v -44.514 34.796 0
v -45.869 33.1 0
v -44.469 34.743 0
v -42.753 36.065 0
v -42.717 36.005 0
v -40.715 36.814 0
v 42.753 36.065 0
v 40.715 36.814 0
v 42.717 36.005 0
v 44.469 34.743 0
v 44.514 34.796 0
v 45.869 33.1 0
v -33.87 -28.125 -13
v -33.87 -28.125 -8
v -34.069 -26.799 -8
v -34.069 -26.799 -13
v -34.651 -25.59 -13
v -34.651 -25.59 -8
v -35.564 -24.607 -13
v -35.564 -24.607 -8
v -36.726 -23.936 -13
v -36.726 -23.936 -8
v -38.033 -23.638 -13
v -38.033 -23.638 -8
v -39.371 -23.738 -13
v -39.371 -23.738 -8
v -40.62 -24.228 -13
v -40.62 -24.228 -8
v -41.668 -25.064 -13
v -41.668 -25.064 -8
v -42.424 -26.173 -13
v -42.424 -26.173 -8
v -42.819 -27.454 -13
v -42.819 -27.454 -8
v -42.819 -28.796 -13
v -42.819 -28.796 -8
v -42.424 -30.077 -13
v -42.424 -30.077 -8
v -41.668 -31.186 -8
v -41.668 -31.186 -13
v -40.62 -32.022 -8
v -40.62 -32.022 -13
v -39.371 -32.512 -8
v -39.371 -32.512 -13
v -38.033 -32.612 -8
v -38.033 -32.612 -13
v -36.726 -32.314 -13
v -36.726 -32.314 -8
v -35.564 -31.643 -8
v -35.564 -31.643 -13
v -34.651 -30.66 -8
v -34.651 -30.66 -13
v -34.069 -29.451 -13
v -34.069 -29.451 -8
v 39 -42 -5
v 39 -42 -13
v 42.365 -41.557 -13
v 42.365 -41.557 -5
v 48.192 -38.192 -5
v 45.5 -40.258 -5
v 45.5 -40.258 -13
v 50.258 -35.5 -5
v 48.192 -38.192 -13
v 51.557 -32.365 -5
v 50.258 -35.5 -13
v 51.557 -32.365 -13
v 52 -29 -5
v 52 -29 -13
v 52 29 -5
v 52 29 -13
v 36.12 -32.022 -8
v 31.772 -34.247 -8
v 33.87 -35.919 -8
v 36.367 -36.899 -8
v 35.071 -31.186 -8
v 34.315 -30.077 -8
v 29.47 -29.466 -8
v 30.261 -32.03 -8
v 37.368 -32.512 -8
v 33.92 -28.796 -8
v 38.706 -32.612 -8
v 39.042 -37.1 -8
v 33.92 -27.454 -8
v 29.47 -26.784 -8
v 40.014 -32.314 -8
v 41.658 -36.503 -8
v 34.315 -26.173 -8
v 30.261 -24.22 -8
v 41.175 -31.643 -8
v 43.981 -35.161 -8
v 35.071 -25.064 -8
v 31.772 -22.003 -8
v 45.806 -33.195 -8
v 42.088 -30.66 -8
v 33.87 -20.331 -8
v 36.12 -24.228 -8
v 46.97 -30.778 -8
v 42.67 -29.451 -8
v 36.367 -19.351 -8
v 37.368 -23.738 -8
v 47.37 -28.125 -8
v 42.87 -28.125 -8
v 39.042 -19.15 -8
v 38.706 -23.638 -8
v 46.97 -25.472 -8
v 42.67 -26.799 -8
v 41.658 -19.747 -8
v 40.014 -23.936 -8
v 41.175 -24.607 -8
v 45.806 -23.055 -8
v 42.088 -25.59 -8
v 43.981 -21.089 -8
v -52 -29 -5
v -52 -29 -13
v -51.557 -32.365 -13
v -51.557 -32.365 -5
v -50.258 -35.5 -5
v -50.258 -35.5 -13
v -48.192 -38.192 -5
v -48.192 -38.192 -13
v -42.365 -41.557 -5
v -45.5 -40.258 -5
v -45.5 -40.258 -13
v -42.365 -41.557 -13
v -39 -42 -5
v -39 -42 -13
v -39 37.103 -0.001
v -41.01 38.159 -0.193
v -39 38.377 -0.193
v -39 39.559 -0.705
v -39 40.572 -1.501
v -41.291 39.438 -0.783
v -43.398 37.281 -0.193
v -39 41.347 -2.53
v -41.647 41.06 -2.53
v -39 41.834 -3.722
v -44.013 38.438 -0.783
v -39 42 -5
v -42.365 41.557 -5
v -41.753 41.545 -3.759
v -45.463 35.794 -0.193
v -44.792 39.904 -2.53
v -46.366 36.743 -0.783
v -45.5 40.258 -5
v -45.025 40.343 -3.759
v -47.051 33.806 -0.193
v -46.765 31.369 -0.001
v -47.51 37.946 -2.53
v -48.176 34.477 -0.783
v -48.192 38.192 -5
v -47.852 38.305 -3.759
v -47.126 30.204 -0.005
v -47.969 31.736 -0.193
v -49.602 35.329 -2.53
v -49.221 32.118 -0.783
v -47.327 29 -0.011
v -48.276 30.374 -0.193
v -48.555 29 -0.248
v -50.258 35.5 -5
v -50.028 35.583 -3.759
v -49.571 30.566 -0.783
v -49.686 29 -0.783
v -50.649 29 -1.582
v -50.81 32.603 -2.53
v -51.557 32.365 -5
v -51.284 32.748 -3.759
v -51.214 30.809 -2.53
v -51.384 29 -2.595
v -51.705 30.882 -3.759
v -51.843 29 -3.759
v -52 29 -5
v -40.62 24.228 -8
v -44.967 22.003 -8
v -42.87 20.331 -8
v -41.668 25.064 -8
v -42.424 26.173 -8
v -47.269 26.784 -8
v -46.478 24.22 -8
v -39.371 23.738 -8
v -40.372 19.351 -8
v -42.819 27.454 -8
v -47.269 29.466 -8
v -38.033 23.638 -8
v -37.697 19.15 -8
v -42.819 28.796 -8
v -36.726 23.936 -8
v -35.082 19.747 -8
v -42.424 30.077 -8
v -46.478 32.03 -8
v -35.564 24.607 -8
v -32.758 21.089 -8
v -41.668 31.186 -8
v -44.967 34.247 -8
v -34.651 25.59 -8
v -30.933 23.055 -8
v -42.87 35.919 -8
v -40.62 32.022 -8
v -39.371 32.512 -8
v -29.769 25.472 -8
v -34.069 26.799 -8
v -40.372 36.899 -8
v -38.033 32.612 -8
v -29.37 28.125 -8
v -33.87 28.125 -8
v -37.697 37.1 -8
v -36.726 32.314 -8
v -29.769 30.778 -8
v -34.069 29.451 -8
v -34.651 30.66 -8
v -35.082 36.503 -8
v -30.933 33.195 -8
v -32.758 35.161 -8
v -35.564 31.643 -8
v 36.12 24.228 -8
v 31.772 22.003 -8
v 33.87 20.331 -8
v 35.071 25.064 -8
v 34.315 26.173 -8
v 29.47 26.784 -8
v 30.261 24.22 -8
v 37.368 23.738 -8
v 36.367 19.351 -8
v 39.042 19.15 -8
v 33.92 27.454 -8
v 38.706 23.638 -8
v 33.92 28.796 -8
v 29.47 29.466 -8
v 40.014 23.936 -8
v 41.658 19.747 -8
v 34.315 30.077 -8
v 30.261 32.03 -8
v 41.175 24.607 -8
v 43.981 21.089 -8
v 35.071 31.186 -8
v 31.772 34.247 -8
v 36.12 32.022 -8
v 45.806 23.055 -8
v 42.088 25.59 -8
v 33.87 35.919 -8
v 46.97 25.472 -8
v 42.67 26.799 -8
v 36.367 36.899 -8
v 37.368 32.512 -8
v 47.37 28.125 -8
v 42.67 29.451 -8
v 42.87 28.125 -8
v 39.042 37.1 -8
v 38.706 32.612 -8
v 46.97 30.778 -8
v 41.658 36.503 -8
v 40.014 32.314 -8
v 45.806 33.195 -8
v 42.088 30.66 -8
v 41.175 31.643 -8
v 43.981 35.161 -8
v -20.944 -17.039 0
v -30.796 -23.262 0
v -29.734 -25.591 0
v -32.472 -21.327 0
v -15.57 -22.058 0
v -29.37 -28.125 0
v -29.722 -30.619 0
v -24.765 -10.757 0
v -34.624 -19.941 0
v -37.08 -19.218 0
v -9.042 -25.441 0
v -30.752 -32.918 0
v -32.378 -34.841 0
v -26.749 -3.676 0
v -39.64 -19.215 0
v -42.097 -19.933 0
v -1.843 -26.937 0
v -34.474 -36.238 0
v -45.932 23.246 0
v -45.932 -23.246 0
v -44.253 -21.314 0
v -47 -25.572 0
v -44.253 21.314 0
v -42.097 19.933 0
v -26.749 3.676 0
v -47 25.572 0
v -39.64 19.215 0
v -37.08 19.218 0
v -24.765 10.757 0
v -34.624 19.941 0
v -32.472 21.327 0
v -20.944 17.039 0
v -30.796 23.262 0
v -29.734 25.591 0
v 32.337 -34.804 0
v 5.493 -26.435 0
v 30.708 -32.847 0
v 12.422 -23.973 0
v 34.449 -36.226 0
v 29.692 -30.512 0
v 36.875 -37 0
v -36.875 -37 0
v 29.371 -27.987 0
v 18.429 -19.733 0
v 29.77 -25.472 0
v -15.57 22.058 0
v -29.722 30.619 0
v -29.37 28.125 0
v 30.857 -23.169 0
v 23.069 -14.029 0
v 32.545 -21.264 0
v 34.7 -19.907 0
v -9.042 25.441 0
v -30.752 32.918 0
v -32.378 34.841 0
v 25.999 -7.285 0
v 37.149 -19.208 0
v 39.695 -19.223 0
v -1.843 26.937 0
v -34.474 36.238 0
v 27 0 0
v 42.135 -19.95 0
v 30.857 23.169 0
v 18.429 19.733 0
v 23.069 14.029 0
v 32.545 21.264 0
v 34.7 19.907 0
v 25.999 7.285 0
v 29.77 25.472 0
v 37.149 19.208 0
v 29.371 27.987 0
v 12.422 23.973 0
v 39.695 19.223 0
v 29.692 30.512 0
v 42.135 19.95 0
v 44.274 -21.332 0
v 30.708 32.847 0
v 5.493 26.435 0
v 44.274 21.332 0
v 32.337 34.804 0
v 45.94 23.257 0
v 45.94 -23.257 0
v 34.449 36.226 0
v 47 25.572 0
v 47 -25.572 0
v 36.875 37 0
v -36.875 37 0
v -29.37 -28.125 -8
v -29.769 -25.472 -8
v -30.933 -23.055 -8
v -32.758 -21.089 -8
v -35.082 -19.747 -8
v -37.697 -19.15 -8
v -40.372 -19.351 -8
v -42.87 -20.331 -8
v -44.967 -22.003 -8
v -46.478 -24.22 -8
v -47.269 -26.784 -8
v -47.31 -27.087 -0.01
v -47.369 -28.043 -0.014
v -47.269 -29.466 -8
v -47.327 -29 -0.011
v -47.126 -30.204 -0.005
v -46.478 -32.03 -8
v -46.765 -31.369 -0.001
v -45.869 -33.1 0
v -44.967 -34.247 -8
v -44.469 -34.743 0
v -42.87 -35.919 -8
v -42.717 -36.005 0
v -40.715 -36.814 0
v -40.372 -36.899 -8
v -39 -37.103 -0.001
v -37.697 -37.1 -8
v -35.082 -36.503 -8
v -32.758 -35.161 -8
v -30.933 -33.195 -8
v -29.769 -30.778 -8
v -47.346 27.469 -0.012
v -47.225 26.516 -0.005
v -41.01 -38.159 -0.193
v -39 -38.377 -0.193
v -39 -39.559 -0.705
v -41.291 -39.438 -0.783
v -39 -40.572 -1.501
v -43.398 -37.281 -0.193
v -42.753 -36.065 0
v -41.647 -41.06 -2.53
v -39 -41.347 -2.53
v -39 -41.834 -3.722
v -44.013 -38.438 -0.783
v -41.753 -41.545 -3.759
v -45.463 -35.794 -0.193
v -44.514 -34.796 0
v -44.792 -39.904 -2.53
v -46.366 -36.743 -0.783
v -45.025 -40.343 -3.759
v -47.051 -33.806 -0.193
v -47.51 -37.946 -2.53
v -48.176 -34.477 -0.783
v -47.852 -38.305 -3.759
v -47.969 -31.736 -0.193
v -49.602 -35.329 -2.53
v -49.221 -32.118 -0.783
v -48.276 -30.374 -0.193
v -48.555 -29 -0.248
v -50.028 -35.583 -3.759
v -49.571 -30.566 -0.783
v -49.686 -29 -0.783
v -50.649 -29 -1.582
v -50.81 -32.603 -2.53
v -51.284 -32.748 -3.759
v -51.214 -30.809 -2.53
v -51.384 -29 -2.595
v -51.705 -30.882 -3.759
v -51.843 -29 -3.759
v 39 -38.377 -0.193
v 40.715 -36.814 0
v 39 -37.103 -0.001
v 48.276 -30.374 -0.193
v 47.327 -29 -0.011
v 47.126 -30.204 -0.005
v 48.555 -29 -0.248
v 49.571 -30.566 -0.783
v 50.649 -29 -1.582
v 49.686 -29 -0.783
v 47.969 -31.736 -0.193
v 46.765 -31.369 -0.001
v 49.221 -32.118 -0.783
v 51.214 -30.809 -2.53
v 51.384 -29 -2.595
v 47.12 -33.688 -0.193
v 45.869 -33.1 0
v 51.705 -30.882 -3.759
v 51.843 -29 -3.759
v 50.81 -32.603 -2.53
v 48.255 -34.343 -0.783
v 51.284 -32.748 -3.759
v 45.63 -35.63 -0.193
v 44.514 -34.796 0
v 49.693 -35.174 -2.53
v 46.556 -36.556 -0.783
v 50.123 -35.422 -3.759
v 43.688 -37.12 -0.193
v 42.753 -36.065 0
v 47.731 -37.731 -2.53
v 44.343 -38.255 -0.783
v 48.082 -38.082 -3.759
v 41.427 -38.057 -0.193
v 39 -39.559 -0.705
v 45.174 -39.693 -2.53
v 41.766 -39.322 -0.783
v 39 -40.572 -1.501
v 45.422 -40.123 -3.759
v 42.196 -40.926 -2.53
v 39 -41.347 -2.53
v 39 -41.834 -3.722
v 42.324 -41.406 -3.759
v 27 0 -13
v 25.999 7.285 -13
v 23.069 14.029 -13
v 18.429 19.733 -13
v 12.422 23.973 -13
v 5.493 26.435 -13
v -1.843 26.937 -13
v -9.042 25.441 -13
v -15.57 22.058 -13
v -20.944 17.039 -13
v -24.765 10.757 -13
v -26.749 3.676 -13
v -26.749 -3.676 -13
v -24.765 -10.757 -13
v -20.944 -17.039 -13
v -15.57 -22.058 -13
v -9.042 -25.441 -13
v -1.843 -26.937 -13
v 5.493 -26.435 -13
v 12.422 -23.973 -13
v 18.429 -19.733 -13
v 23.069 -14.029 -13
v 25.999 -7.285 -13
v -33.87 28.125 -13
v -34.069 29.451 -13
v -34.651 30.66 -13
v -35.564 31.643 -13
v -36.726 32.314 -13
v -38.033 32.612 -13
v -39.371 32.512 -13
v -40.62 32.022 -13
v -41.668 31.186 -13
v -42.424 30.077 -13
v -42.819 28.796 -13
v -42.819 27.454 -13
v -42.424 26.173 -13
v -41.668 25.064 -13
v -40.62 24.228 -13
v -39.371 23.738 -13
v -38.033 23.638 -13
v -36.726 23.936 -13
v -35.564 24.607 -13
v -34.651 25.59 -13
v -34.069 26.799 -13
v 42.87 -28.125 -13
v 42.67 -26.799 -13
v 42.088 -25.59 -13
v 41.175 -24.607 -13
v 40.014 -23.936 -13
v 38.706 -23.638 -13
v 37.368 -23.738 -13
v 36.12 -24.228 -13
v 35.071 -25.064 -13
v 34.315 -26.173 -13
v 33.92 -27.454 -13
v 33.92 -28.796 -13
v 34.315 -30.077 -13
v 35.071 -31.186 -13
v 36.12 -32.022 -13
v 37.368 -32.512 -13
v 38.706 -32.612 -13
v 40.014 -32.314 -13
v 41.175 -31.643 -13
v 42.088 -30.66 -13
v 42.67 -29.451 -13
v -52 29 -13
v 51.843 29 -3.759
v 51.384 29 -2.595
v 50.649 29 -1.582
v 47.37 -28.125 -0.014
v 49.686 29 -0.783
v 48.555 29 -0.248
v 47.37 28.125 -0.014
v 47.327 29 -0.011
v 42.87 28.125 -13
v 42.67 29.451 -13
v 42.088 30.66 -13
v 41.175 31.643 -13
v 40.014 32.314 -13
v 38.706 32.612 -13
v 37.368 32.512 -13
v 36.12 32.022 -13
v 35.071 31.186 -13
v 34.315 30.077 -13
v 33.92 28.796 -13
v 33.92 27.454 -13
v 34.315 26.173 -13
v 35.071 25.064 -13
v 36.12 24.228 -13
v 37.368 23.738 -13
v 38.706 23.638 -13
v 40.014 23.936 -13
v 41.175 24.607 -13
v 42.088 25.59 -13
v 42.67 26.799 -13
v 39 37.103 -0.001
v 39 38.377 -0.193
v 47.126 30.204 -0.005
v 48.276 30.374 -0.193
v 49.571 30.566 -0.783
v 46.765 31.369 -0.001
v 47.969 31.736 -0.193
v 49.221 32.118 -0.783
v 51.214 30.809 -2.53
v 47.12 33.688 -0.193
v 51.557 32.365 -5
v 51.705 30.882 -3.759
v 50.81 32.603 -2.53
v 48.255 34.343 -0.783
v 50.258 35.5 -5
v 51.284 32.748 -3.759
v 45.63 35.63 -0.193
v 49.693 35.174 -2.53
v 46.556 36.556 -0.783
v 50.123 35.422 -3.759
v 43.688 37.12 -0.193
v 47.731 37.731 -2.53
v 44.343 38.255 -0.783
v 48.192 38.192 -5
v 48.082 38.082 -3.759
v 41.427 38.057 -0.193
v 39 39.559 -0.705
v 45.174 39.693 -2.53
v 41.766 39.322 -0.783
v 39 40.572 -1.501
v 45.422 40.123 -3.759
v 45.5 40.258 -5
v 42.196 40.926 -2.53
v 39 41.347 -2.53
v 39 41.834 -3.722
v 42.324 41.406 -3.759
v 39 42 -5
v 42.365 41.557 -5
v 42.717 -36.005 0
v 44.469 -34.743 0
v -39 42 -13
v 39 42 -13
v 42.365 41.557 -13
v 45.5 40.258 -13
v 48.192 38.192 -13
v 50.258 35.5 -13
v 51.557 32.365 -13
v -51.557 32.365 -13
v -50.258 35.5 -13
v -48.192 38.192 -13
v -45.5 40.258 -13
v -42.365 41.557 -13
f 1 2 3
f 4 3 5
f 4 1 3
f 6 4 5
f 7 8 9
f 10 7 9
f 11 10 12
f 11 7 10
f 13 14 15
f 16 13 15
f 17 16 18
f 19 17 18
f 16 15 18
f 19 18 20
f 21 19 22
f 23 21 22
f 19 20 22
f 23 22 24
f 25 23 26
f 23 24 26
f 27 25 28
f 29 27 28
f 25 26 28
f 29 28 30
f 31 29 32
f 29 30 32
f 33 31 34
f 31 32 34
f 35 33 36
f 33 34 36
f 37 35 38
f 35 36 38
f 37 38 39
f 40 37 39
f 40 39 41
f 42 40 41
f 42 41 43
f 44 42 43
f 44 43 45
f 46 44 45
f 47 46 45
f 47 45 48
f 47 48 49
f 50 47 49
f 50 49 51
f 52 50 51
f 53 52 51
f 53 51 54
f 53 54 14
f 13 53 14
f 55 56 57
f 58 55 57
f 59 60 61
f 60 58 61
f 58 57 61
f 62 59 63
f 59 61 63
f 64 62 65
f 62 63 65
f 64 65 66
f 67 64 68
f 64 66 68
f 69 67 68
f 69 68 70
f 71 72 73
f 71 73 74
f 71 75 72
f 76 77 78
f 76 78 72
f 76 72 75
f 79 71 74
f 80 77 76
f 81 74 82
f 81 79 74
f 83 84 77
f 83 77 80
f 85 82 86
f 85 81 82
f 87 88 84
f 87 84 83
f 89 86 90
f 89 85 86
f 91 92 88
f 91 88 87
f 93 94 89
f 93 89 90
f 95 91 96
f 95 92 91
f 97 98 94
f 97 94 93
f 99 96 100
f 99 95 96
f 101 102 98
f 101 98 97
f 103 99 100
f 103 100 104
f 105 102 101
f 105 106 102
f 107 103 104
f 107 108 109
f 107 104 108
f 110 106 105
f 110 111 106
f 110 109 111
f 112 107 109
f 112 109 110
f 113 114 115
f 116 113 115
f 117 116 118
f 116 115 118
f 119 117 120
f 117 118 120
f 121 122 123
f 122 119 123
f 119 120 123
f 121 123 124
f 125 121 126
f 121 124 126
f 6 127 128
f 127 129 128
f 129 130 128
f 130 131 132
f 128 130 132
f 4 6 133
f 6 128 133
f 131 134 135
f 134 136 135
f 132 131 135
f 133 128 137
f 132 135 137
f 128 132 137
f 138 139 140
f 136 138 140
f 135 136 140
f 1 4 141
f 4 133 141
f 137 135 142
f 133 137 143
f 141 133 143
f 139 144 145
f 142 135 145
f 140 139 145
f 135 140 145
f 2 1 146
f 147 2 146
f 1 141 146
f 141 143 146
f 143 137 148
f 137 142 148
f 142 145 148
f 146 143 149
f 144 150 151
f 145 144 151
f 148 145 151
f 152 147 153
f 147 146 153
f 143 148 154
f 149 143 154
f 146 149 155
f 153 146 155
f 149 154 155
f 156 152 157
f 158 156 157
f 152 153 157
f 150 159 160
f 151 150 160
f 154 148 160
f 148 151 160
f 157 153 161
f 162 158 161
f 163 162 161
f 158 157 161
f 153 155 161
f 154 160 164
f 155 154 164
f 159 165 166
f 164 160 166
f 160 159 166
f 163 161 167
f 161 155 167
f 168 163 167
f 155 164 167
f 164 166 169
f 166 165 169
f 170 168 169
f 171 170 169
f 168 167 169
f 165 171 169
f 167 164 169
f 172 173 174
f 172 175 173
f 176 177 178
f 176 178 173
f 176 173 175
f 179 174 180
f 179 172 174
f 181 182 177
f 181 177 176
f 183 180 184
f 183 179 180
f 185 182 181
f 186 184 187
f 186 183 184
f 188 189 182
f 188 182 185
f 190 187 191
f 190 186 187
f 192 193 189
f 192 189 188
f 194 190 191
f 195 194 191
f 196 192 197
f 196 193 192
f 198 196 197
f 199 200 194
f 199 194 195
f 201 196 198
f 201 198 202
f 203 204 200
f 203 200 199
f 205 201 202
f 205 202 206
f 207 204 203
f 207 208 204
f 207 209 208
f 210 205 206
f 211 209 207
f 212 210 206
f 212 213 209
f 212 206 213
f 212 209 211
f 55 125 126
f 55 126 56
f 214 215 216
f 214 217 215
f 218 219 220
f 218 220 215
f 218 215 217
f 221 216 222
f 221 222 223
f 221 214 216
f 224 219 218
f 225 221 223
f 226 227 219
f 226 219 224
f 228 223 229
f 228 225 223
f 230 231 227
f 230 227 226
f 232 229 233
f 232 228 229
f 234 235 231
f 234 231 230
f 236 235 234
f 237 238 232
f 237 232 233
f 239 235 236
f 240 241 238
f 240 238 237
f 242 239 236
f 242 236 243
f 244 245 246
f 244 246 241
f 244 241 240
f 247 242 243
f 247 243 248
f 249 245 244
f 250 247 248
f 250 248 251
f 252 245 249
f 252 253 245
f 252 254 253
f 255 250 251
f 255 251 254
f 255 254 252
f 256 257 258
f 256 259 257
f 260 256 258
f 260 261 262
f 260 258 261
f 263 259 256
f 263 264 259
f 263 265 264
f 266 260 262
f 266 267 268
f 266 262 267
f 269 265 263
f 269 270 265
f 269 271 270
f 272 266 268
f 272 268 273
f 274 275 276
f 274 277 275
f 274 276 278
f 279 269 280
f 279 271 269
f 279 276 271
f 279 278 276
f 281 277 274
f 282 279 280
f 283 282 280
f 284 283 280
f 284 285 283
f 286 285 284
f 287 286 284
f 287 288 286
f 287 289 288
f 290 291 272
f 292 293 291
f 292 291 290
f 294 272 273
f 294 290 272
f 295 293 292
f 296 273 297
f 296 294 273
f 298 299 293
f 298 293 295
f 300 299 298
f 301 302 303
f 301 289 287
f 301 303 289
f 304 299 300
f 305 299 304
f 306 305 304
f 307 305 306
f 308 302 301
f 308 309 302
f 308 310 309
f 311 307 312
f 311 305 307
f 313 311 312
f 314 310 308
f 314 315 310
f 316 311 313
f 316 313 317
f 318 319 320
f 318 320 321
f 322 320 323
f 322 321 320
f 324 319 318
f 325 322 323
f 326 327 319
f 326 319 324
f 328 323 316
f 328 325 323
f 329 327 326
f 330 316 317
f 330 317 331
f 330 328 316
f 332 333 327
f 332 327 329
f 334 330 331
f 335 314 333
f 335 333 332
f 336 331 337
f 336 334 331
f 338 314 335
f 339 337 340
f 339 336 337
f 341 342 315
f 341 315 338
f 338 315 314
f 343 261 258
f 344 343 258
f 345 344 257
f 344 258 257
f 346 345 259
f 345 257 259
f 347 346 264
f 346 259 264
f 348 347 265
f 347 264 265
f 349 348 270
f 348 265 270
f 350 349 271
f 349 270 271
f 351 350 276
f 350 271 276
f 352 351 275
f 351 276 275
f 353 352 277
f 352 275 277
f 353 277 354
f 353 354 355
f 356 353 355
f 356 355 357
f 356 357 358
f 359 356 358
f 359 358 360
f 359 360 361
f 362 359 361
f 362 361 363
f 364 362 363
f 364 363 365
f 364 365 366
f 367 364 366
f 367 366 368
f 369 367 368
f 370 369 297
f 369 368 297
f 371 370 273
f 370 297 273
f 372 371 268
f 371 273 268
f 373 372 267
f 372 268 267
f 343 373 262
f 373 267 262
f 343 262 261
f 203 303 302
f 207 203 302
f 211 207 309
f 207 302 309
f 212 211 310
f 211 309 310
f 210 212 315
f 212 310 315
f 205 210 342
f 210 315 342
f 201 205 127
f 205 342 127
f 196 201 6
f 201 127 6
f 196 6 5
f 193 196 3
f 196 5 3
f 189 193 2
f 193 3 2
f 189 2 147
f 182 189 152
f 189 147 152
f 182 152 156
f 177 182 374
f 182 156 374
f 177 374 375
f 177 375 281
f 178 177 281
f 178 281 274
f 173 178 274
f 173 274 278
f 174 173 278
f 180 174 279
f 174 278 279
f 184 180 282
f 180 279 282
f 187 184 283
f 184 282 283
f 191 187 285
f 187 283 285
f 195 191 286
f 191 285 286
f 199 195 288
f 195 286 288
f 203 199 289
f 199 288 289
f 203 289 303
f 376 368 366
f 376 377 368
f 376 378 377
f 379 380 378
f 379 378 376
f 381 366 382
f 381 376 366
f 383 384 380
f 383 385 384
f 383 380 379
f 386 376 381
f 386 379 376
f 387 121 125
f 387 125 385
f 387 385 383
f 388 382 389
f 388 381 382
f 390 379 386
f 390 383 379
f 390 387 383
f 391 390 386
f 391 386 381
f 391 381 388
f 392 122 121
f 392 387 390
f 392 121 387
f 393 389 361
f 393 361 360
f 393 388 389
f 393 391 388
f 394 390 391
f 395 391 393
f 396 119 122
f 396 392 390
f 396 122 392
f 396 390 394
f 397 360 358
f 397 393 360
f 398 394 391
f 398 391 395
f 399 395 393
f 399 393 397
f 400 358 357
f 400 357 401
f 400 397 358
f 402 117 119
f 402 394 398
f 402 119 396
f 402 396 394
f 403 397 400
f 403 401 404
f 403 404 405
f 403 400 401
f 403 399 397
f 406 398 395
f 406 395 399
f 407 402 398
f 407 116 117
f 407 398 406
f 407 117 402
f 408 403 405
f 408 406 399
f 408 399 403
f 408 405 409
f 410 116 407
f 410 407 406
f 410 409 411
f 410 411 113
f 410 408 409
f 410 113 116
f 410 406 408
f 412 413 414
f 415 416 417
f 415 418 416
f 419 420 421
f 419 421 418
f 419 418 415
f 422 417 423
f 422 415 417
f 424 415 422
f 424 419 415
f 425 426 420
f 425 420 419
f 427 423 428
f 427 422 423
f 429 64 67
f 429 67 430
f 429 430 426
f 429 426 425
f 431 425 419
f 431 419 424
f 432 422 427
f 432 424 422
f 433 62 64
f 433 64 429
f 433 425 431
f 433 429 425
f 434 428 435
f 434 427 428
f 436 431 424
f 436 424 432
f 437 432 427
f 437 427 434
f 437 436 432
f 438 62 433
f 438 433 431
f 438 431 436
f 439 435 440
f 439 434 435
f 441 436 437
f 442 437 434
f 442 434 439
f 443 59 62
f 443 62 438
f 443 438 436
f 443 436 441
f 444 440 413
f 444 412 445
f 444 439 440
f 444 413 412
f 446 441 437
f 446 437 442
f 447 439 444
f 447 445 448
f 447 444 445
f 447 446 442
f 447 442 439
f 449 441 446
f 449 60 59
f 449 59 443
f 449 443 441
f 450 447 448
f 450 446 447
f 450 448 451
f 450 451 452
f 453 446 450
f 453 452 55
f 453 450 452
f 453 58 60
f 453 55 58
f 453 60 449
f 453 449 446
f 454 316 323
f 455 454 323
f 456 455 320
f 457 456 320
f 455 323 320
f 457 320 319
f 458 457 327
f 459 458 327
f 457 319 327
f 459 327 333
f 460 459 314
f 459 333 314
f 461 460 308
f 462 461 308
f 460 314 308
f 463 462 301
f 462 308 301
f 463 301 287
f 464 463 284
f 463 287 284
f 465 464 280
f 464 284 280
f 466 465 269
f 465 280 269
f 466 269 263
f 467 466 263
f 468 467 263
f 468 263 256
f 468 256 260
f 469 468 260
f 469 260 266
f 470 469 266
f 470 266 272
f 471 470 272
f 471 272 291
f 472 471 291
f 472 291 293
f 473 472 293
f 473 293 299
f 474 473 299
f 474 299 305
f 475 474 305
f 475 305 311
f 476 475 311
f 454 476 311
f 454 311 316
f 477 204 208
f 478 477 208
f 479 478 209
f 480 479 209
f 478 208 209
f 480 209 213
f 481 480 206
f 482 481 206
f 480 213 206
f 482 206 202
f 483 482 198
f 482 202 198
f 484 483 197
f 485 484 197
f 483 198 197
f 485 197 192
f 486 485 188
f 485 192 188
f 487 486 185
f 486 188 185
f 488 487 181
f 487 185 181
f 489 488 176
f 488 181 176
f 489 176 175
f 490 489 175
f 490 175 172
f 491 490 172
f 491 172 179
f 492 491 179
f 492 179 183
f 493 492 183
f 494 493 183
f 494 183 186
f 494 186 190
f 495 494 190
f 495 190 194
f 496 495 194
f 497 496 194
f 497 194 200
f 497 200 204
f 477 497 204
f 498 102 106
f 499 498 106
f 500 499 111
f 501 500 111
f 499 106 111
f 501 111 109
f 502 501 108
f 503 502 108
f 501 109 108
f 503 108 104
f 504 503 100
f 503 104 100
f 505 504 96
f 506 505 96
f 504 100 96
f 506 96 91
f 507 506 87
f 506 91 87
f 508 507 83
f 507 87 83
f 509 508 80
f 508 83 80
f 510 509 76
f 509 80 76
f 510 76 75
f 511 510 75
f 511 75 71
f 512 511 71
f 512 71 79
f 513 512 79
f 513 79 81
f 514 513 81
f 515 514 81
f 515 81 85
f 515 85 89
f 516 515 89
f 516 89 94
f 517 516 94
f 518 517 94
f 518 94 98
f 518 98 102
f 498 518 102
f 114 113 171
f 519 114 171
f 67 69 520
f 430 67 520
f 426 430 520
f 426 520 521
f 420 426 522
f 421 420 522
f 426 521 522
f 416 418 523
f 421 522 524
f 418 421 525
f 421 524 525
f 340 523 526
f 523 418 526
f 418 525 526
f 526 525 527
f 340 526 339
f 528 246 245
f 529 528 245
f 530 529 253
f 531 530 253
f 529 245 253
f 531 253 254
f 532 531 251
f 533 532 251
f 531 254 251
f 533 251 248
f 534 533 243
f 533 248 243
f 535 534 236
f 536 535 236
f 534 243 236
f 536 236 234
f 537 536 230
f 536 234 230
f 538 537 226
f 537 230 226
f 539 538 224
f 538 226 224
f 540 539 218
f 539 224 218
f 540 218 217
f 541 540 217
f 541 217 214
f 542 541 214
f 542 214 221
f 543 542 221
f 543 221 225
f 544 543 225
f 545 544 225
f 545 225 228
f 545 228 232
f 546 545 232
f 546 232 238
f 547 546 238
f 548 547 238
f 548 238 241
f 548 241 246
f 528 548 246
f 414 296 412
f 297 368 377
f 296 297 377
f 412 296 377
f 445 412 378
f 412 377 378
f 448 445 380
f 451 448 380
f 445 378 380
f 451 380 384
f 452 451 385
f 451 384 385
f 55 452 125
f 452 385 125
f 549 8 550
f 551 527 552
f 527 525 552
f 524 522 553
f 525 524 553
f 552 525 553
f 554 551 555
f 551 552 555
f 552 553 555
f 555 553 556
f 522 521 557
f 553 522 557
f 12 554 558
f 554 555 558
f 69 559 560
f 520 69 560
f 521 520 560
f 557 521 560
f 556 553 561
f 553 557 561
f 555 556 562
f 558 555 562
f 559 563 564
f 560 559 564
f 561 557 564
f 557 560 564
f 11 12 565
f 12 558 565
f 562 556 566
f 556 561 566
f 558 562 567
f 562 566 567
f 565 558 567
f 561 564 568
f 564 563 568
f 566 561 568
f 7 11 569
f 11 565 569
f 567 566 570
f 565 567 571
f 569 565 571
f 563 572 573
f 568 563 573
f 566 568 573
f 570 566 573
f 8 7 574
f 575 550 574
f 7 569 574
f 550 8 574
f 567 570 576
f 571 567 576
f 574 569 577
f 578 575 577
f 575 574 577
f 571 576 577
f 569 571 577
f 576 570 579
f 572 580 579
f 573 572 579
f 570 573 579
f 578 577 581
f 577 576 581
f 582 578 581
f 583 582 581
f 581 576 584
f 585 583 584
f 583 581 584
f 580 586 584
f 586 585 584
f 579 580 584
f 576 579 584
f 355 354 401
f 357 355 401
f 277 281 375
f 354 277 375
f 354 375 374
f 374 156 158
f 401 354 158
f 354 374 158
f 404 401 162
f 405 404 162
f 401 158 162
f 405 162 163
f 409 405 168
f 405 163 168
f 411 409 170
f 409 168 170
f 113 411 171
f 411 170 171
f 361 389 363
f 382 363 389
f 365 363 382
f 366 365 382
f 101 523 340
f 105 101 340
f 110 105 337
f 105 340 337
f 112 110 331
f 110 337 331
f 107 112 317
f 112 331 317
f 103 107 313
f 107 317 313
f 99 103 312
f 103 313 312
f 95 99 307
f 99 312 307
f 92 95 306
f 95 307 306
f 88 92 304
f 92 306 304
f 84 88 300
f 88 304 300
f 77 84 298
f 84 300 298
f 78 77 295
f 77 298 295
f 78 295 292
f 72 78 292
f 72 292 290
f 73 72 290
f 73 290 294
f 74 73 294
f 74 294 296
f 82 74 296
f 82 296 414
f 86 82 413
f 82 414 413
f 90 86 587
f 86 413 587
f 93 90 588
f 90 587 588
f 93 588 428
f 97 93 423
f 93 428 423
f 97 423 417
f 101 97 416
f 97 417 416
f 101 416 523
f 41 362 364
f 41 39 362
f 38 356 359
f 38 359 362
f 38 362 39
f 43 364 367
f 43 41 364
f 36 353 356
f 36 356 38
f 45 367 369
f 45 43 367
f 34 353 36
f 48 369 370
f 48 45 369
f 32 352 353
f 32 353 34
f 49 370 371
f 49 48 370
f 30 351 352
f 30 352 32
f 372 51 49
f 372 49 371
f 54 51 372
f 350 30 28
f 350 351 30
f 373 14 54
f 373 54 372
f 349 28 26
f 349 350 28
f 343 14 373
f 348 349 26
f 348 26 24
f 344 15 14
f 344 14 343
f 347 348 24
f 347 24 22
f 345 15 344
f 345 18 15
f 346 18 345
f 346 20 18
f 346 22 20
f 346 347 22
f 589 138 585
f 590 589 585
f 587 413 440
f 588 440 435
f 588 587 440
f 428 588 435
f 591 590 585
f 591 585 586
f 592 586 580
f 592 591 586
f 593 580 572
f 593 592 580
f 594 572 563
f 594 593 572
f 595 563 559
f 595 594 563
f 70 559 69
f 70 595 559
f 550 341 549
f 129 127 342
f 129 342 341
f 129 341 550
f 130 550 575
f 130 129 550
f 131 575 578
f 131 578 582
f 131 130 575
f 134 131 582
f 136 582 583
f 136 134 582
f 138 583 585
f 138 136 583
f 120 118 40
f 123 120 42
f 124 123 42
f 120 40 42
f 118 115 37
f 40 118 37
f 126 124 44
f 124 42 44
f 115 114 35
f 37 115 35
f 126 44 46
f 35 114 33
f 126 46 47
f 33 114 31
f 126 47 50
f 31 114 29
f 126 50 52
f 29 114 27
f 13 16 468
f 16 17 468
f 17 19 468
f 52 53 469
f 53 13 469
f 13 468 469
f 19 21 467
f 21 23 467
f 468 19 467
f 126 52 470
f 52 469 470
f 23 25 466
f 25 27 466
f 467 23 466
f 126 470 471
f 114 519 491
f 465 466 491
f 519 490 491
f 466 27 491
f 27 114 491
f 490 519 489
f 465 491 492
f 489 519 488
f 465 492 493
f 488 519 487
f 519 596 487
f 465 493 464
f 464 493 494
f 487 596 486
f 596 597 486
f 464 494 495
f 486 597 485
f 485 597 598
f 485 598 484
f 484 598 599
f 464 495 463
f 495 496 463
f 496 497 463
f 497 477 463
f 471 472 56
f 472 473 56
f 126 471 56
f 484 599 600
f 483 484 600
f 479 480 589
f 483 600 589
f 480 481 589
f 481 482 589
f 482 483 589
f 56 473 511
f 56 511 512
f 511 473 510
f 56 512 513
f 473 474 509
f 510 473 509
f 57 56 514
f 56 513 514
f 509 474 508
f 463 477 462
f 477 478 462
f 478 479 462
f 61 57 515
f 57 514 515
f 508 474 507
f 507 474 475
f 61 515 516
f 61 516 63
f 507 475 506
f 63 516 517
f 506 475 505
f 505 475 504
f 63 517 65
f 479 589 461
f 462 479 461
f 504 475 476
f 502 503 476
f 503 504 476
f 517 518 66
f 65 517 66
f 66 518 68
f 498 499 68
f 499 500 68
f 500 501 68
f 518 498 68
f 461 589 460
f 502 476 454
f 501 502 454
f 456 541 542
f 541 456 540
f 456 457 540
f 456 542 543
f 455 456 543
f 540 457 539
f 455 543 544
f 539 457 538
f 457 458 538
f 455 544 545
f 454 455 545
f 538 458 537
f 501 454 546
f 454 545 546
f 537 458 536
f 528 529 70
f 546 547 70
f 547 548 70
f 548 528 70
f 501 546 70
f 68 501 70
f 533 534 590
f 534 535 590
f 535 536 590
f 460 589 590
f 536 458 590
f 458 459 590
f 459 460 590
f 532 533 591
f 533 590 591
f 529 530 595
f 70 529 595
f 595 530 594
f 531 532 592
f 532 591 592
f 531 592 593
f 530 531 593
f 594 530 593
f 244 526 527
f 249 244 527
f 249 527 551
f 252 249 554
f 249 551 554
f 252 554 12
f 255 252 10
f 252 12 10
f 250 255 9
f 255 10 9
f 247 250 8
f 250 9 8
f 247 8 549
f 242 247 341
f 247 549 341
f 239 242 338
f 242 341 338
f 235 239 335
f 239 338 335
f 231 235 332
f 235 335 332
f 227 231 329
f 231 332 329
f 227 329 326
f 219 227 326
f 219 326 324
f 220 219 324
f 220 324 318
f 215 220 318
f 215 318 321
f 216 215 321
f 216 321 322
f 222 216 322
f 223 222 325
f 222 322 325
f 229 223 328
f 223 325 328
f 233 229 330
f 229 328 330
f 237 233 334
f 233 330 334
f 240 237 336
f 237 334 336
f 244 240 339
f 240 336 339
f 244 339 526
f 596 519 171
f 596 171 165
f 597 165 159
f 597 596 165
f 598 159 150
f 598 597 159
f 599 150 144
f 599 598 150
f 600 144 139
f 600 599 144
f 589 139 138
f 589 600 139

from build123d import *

# Parameters (mm, degrees)
F0_W          = 104
F0_H          = 84
F1_DEPTH      = 13
F3_R          = 9
F4_DEPTH      = 8
F5_R          = 4.5
F6_DEPTH      = 25
F7_R          = 27
F8_DEPTH      = 25
F9_R          = 13
F10_T1_DEPTH  = 58
F10_T3_DEPTH  = 78
F10_T6_ANGLE  = 90
F10_T8_ANGLE  = 90
F10_T10_ANGLE = 90
F10_T12_ANGLE = 90


# Not quite as in the source:
# - a fillet or chamfer that OpenCascade refuses, or shapes differently, is made with other operations: its cross-section is extruded or revolved along the edge and cut away or added


with BuildPart() as f1:
    # F0 (on Top) → F1 (new body)
    with BuildSketch(Plane.XY):
        Rectangle(F0_W, F0_H)
    extrude(amount=-F1_DEPTH)

    # F3 (on Top) → F4 (cut)
    with BuildSketch(Plane.XY):
        with Locations((38.3695703445, 28.125)):
            Circle(F3_R)
        with Locations((38.3695703445, -28.125)):
            Circle(F3_R)
        with Locations((-38.3695703445, 28.125)):
            Circle(F3_R)
        with Locations((-38.3695703445, -28.125)):
            Circle(F3_R)
    extrude(amount=-F4_DEPTH, mode=Mode.SUBTRACT)

    # F5 (on face) → F6 (cut)
    with BuildSketch(Plane.XY.offset(-8)):
        with Locations((38.3695703445, 28.125)):
            Circle(F5_R)
        with Locations((38.3695703445, -28.125)):
            Circle(F5_R)
        with Locations((-38.3695703445, 28.125)):
            Circle(F5_R)
        with Locations((-38.3695703445, -28.125)):
            Circle(F5_R)
    extrude(amount=-F6_DEPTH, mode=Mode.SUBTRACT)

    # F7 (on Top) → F8 (cut)
    with BuildSketch(Plane.XY):
        Circle(F7_R)
    extrude(amount=-F8_DEPTH, mode=Mode.SUBTRACT)

    # F9
    f9_edges = [f1.edges().sort_by_distance(p)[0] for p in [
        (-52, 42, -6.5),
        (-52, -42, -6.5),
        (52, -42, -6.5),
        (52, 42, -6.5),
    ]]
    fillet(f9_edges, radius=F9_R)

    # F10: fillet of radius 5 on 8 edges, made by hand

    # F10_s2 → F10_t1 (cut)
    with BuildSketch(Plane.XZ.offset(-29)):
        with BuildLine():
            ThreePointArc((-47, 0), (-50.5355339059, -1.4644660941), (-52, -5))
            Line((-52, -5), (-52, 0))
            Line((-52, 0), (-47, 0))
        make_face()
        with BuildLine():
            ThreePointArc((52, -5), (50.5355339059, -1.4644660941), (47, 0))
            Line((47, 0), (52, 0))
            Line((52, 0), (52, -5))
        make_face()
    extrude(amount=F10_T1_DEPTH, mode=Mode.SUBTRACT)

    # F10_s4 → F10_t3 (cut)
    with BuildSketch(Plane.YZ.offset(-39)):
        with BuildLine():
            ThreePointArc((-37, 0), (-40.5355339059, -1.4644660941), (-42, -5))
            Line((-42, -5), (-42, 0))
            Line((-42, 0), (-37, 0))
        make_face()
        with BuildLine():
            ThreePointArc((37, 0), (40.5355339059, -1.4644660941), (42, -5))
            Line((42, -5), (42, 0))
            Line((42, 0), (37, 0))
        make_face()
    extrude(amount=F10_T3_DEPTH, mode=Mode.SUBTRACT)

    # F10_s5 → F10_t6 (revolve, cut)
    with BuildSketch(Plane.XZ.offset(29)):
        with BuildLine():
            ThreePointArc((47, 0), (50.5355339059, -1.4644660941), (52, -5))
            Line((52, -5), (52, 0))
            Line((52, 0), (47, 0))
        make_face()
    revolve(axis=Axis((39, -29, 0), (0, 0, -1)), revolution_arc=F10_T6_ANGLE, mode=Mode.SUBTRACT)

    # F10_s7 → F10_t8 (revolve, cut)
    with BuildSketch(Plane.XZ.offset(-29)):
        with BuildLine():
            ThreePointArc((47, 0), (50.5355339059, -1.4644660941), (52, -5))
            Line((52, -5), (52, 0))
            Line((52, 0), (47, 0))
        make_face()
    revolve(axis=Axis((39, 29, 0), (0, 0, 1)), revolution_arc=F10_T8_ANGLE, mode=Mode.SUBTRACT)

    # F10_s9 → F10_t10 (revolve, cut)
    with BuildSketch(Plane.YZ.offset(-39)):
        with BuildLine():
            ThreePointArc((-37, 0), (-40.5355339059, -1.4644660941), (-42, -5))
            Line((-42, -5), (-42, 0))
            Line((-42, 0), (-37, 0))
        make_face()
    revolve(axis=Axis((-39, -29, 0), (0, 0, -1)), revolution_arc=F10_T10_ANGLE, mode=Mode.SUBTRACT)

    # F10_s11 → F10_t12 (revolve, cut)
    with BuildSketch(Plane.YZ.offset(-39)):
        with BuildLine():
            ThreePointArc((37, 0), (40.5355339059, -1.4644660941), (42, -5))
            Line((42, -5), (42, 0))
            Line((42, 0), (37, 0))
        make_face()
    revolve(axis=Axis((-39, 29, 0), (0, 0, 1)), revolution_arc=F10_T12_ANGLE, mode=Mode.SUBTRACT)


solid = f1.part
